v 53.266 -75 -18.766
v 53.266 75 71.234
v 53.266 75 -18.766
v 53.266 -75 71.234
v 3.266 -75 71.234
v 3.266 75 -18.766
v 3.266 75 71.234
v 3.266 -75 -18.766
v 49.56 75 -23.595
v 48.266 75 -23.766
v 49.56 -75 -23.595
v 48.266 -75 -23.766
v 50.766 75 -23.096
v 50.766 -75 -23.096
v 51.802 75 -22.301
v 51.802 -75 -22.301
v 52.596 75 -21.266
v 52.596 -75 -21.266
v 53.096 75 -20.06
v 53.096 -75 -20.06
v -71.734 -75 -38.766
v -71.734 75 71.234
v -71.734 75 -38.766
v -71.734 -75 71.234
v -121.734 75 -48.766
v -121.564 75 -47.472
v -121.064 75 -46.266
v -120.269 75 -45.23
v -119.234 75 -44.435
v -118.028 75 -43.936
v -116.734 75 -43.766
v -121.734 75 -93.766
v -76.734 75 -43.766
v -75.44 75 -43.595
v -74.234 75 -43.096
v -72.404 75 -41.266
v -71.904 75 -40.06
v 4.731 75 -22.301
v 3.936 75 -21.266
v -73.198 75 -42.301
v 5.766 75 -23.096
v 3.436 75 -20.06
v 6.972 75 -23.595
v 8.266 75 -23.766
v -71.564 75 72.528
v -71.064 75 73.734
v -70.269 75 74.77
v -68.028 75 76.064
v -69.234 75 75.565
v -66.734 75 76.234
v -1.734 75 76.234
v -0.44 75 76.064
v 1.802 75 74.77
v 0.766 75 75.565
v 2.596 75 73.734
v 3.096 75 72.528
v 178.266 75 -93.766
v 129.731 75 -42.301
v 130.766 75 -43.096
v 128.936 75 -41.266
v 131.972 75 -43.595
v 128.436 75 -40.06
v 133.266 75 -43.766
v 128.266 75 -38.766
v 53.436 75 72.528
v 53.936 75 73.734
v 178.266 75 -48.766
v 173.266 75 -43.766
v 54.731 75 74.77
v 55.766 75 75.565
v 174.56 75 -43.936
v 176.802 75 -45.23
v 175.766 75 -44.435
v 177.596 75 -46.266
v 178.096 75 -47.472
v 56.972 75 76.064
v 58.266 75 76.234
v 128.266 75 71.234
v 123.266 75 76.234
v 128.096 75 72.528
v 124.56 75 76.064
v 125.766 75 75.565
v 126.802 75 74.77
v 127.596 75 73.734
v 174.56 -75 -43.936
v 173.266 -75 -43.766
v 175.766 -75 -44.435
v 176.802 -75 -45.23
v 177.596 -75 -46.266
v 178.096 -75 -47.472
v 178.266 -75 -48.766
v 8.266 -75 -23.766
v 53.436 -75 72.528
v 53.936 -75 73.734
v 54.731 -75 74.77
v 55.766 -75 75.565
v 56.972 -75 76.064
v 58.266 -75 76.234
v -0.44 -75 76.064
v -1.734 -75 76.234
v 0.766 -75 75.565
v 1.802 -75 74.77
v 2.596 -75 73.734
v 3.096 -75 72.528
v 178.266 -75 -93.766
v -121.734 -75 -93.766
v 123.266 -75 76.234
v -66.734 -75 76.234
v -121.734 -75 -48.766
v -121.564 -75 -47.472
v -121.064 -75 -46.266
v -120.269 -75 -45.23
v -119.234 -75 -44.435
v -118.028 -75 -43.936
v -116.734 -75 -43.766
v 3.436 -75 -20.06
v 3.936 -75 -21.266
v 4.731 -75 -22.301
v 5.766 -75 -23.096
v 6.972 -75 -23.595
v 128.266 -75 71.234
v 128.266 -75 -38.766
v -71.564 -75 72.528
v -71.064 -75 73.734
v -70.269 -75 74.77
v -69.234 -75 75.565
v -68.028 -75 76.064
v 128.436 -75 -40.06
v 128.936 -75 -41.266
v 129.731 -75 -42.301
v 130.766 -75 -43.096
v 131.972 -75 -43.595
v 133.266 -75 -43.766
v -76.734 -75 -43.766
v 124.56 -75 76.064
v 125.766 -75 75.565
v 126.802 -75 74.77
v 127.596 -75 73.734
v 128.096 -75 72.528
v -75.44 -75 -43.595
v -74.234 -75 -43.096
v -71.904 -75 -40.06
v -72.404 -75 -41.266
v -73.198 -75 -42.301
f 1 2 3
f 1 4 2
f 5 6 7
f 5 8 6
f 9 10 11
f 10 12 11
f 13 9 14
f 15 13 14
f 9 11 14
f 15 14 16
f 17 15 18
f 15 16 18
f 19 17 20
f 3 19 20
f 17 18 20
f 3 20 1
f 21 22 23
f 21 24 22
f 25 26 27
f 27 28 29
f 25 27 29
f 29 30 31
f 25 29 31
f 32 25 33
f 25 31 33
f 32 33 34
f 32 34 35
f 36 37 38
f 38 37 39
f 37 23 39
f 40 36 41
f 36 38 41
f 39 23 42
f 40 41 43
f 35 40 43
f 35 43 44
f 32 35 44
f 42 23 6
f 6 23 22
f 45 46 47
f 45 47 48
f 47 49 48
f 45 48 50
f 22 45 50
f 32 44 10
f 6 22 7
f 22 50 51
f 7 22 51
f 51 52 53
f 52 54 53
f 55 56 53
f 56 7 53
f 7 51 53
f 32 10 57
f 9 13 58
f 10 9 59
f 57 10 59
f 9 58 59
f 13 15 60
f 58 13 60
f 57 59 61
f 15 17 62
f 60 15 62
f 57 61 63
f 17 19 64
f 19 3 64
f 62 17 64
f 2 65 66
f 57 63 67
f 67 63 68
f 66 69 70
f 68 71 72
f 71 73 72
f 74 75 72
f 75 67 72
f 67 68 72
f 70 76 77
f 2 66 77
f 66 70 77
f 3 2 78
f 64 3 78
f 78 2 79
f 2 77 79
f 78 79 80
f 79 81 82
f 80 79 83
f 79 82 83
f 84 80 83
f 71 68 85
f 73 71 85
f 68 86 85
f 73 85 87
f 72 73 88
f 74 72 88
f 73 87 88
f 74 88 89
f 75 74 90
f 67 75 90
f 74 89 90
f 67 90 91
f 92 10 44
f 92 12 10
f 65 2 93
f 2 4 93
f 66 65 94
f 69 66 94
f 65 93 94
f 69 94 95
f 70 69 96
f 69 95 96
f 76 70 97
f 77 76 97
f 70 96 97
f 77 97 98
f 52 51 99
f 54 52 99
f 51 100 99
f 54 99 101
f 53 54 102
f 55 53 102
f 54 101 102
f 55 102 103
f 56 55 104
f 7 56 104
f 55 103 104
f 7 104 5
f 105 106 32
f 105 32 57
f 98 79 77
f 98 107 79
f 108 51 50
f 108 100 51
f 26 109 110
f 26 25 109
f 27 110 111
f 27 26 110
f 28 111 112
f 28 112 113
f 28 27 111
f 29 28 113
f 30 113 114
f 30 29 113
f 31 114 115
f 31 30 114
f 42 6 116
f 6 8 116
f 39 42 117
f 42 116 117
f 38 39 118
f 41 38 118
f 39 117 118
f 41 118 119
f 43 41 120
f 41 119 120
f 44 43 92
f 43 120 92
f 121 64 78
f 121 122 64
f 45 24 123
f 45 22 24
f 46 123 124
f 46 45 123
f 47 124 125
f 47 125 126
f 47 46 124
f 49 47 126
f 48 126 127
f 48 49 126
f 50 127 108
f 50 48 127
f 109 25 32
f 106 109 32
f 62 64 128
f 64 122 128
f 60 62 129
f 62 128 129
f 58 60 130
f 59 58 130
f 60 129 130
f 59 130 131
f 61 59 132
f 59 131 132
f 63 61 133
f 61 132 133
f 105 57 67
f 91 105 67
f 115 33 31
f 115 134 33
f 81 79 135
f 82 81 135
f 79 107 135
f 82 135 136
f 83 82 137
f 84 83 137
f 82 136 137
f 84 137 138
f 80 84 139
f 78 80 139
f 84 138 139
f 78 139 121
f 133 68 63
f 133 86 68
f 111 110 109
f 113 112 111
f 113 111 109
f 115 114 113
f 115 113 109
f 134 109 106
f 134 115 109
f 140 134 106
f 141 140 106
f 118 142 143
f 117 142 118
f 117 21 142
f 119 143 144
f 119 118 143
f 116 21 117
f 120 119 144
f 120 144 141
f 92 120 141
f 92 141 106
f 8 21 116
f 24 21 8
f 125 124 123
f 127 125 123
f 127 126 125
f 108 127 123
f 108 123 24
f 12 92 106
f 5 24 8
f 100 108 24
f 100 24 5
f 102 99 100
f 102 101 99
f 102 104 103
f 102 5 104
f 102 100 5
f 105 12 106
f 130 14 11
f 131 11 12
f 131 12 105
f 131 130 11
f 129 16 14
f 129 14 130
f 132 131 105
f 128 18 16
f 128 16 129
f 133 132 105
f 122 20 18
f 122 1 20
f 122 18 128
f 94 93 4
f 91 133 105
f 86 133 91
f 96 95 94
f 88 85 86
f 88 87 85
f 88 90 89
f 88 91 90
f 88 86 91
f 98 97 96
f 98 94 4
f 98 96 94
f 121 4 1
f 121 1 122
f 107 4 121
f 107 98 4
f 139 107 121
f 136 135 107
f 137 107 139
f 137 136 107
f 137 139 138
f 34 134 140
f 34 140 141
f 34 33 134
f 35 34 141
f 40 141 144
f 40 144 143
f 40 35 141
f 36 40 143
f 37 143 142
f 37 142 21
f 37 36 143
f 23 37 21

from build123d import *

# Parameters (mm, degrees)
F1_DEPTH = 75
F2_R     = 5


with BuildPart() as f1:
    # F0 (on Front) → F1 (new body, symmetric)
    with BuildSketch(Plane.XZ):
        Polygon((-71.73389, -43.765602), (-121.73389, -43.765602), (-121.73389, -93.765602), (178.26611, -93.765602), (178.26611, -43.765602), (128.26611, -43.765602), align=None)
        Polygon((-71.73389, 76.234398), (-71.73389, -43.765602), (128.26611, -43.765602), (128.26611, 76.234398), (53.26611, 76.234398), (53.26611, -23.765602), (3.26611, -23.765602), (3.26611, 76.234398), align=None)
    extrude(amount=F1_DEPTH, both=True)

    # F2
    f2_edges = [f1.edges().sort_by_distance(p)[0] for p in [
        (53.26611, 0, 76.234398),
        (3.26611, 0, 76.234398),
        (128.26611, 0, 76.234398),
        (-71.73389, 0, 76.234398),
        (-71.73389, 0, -43.765602),
        (-121.73389, 0, -43.765602),
        (128.26611, 0, -43.765602),
        (178.26611, 0, -43.765602),
        (3.26611, 0, -23.765602),
        (53.26611, 0, -23.765602),
    ]]
    fillet(f2_edges, radius=F2_R)


solid = f1.part
